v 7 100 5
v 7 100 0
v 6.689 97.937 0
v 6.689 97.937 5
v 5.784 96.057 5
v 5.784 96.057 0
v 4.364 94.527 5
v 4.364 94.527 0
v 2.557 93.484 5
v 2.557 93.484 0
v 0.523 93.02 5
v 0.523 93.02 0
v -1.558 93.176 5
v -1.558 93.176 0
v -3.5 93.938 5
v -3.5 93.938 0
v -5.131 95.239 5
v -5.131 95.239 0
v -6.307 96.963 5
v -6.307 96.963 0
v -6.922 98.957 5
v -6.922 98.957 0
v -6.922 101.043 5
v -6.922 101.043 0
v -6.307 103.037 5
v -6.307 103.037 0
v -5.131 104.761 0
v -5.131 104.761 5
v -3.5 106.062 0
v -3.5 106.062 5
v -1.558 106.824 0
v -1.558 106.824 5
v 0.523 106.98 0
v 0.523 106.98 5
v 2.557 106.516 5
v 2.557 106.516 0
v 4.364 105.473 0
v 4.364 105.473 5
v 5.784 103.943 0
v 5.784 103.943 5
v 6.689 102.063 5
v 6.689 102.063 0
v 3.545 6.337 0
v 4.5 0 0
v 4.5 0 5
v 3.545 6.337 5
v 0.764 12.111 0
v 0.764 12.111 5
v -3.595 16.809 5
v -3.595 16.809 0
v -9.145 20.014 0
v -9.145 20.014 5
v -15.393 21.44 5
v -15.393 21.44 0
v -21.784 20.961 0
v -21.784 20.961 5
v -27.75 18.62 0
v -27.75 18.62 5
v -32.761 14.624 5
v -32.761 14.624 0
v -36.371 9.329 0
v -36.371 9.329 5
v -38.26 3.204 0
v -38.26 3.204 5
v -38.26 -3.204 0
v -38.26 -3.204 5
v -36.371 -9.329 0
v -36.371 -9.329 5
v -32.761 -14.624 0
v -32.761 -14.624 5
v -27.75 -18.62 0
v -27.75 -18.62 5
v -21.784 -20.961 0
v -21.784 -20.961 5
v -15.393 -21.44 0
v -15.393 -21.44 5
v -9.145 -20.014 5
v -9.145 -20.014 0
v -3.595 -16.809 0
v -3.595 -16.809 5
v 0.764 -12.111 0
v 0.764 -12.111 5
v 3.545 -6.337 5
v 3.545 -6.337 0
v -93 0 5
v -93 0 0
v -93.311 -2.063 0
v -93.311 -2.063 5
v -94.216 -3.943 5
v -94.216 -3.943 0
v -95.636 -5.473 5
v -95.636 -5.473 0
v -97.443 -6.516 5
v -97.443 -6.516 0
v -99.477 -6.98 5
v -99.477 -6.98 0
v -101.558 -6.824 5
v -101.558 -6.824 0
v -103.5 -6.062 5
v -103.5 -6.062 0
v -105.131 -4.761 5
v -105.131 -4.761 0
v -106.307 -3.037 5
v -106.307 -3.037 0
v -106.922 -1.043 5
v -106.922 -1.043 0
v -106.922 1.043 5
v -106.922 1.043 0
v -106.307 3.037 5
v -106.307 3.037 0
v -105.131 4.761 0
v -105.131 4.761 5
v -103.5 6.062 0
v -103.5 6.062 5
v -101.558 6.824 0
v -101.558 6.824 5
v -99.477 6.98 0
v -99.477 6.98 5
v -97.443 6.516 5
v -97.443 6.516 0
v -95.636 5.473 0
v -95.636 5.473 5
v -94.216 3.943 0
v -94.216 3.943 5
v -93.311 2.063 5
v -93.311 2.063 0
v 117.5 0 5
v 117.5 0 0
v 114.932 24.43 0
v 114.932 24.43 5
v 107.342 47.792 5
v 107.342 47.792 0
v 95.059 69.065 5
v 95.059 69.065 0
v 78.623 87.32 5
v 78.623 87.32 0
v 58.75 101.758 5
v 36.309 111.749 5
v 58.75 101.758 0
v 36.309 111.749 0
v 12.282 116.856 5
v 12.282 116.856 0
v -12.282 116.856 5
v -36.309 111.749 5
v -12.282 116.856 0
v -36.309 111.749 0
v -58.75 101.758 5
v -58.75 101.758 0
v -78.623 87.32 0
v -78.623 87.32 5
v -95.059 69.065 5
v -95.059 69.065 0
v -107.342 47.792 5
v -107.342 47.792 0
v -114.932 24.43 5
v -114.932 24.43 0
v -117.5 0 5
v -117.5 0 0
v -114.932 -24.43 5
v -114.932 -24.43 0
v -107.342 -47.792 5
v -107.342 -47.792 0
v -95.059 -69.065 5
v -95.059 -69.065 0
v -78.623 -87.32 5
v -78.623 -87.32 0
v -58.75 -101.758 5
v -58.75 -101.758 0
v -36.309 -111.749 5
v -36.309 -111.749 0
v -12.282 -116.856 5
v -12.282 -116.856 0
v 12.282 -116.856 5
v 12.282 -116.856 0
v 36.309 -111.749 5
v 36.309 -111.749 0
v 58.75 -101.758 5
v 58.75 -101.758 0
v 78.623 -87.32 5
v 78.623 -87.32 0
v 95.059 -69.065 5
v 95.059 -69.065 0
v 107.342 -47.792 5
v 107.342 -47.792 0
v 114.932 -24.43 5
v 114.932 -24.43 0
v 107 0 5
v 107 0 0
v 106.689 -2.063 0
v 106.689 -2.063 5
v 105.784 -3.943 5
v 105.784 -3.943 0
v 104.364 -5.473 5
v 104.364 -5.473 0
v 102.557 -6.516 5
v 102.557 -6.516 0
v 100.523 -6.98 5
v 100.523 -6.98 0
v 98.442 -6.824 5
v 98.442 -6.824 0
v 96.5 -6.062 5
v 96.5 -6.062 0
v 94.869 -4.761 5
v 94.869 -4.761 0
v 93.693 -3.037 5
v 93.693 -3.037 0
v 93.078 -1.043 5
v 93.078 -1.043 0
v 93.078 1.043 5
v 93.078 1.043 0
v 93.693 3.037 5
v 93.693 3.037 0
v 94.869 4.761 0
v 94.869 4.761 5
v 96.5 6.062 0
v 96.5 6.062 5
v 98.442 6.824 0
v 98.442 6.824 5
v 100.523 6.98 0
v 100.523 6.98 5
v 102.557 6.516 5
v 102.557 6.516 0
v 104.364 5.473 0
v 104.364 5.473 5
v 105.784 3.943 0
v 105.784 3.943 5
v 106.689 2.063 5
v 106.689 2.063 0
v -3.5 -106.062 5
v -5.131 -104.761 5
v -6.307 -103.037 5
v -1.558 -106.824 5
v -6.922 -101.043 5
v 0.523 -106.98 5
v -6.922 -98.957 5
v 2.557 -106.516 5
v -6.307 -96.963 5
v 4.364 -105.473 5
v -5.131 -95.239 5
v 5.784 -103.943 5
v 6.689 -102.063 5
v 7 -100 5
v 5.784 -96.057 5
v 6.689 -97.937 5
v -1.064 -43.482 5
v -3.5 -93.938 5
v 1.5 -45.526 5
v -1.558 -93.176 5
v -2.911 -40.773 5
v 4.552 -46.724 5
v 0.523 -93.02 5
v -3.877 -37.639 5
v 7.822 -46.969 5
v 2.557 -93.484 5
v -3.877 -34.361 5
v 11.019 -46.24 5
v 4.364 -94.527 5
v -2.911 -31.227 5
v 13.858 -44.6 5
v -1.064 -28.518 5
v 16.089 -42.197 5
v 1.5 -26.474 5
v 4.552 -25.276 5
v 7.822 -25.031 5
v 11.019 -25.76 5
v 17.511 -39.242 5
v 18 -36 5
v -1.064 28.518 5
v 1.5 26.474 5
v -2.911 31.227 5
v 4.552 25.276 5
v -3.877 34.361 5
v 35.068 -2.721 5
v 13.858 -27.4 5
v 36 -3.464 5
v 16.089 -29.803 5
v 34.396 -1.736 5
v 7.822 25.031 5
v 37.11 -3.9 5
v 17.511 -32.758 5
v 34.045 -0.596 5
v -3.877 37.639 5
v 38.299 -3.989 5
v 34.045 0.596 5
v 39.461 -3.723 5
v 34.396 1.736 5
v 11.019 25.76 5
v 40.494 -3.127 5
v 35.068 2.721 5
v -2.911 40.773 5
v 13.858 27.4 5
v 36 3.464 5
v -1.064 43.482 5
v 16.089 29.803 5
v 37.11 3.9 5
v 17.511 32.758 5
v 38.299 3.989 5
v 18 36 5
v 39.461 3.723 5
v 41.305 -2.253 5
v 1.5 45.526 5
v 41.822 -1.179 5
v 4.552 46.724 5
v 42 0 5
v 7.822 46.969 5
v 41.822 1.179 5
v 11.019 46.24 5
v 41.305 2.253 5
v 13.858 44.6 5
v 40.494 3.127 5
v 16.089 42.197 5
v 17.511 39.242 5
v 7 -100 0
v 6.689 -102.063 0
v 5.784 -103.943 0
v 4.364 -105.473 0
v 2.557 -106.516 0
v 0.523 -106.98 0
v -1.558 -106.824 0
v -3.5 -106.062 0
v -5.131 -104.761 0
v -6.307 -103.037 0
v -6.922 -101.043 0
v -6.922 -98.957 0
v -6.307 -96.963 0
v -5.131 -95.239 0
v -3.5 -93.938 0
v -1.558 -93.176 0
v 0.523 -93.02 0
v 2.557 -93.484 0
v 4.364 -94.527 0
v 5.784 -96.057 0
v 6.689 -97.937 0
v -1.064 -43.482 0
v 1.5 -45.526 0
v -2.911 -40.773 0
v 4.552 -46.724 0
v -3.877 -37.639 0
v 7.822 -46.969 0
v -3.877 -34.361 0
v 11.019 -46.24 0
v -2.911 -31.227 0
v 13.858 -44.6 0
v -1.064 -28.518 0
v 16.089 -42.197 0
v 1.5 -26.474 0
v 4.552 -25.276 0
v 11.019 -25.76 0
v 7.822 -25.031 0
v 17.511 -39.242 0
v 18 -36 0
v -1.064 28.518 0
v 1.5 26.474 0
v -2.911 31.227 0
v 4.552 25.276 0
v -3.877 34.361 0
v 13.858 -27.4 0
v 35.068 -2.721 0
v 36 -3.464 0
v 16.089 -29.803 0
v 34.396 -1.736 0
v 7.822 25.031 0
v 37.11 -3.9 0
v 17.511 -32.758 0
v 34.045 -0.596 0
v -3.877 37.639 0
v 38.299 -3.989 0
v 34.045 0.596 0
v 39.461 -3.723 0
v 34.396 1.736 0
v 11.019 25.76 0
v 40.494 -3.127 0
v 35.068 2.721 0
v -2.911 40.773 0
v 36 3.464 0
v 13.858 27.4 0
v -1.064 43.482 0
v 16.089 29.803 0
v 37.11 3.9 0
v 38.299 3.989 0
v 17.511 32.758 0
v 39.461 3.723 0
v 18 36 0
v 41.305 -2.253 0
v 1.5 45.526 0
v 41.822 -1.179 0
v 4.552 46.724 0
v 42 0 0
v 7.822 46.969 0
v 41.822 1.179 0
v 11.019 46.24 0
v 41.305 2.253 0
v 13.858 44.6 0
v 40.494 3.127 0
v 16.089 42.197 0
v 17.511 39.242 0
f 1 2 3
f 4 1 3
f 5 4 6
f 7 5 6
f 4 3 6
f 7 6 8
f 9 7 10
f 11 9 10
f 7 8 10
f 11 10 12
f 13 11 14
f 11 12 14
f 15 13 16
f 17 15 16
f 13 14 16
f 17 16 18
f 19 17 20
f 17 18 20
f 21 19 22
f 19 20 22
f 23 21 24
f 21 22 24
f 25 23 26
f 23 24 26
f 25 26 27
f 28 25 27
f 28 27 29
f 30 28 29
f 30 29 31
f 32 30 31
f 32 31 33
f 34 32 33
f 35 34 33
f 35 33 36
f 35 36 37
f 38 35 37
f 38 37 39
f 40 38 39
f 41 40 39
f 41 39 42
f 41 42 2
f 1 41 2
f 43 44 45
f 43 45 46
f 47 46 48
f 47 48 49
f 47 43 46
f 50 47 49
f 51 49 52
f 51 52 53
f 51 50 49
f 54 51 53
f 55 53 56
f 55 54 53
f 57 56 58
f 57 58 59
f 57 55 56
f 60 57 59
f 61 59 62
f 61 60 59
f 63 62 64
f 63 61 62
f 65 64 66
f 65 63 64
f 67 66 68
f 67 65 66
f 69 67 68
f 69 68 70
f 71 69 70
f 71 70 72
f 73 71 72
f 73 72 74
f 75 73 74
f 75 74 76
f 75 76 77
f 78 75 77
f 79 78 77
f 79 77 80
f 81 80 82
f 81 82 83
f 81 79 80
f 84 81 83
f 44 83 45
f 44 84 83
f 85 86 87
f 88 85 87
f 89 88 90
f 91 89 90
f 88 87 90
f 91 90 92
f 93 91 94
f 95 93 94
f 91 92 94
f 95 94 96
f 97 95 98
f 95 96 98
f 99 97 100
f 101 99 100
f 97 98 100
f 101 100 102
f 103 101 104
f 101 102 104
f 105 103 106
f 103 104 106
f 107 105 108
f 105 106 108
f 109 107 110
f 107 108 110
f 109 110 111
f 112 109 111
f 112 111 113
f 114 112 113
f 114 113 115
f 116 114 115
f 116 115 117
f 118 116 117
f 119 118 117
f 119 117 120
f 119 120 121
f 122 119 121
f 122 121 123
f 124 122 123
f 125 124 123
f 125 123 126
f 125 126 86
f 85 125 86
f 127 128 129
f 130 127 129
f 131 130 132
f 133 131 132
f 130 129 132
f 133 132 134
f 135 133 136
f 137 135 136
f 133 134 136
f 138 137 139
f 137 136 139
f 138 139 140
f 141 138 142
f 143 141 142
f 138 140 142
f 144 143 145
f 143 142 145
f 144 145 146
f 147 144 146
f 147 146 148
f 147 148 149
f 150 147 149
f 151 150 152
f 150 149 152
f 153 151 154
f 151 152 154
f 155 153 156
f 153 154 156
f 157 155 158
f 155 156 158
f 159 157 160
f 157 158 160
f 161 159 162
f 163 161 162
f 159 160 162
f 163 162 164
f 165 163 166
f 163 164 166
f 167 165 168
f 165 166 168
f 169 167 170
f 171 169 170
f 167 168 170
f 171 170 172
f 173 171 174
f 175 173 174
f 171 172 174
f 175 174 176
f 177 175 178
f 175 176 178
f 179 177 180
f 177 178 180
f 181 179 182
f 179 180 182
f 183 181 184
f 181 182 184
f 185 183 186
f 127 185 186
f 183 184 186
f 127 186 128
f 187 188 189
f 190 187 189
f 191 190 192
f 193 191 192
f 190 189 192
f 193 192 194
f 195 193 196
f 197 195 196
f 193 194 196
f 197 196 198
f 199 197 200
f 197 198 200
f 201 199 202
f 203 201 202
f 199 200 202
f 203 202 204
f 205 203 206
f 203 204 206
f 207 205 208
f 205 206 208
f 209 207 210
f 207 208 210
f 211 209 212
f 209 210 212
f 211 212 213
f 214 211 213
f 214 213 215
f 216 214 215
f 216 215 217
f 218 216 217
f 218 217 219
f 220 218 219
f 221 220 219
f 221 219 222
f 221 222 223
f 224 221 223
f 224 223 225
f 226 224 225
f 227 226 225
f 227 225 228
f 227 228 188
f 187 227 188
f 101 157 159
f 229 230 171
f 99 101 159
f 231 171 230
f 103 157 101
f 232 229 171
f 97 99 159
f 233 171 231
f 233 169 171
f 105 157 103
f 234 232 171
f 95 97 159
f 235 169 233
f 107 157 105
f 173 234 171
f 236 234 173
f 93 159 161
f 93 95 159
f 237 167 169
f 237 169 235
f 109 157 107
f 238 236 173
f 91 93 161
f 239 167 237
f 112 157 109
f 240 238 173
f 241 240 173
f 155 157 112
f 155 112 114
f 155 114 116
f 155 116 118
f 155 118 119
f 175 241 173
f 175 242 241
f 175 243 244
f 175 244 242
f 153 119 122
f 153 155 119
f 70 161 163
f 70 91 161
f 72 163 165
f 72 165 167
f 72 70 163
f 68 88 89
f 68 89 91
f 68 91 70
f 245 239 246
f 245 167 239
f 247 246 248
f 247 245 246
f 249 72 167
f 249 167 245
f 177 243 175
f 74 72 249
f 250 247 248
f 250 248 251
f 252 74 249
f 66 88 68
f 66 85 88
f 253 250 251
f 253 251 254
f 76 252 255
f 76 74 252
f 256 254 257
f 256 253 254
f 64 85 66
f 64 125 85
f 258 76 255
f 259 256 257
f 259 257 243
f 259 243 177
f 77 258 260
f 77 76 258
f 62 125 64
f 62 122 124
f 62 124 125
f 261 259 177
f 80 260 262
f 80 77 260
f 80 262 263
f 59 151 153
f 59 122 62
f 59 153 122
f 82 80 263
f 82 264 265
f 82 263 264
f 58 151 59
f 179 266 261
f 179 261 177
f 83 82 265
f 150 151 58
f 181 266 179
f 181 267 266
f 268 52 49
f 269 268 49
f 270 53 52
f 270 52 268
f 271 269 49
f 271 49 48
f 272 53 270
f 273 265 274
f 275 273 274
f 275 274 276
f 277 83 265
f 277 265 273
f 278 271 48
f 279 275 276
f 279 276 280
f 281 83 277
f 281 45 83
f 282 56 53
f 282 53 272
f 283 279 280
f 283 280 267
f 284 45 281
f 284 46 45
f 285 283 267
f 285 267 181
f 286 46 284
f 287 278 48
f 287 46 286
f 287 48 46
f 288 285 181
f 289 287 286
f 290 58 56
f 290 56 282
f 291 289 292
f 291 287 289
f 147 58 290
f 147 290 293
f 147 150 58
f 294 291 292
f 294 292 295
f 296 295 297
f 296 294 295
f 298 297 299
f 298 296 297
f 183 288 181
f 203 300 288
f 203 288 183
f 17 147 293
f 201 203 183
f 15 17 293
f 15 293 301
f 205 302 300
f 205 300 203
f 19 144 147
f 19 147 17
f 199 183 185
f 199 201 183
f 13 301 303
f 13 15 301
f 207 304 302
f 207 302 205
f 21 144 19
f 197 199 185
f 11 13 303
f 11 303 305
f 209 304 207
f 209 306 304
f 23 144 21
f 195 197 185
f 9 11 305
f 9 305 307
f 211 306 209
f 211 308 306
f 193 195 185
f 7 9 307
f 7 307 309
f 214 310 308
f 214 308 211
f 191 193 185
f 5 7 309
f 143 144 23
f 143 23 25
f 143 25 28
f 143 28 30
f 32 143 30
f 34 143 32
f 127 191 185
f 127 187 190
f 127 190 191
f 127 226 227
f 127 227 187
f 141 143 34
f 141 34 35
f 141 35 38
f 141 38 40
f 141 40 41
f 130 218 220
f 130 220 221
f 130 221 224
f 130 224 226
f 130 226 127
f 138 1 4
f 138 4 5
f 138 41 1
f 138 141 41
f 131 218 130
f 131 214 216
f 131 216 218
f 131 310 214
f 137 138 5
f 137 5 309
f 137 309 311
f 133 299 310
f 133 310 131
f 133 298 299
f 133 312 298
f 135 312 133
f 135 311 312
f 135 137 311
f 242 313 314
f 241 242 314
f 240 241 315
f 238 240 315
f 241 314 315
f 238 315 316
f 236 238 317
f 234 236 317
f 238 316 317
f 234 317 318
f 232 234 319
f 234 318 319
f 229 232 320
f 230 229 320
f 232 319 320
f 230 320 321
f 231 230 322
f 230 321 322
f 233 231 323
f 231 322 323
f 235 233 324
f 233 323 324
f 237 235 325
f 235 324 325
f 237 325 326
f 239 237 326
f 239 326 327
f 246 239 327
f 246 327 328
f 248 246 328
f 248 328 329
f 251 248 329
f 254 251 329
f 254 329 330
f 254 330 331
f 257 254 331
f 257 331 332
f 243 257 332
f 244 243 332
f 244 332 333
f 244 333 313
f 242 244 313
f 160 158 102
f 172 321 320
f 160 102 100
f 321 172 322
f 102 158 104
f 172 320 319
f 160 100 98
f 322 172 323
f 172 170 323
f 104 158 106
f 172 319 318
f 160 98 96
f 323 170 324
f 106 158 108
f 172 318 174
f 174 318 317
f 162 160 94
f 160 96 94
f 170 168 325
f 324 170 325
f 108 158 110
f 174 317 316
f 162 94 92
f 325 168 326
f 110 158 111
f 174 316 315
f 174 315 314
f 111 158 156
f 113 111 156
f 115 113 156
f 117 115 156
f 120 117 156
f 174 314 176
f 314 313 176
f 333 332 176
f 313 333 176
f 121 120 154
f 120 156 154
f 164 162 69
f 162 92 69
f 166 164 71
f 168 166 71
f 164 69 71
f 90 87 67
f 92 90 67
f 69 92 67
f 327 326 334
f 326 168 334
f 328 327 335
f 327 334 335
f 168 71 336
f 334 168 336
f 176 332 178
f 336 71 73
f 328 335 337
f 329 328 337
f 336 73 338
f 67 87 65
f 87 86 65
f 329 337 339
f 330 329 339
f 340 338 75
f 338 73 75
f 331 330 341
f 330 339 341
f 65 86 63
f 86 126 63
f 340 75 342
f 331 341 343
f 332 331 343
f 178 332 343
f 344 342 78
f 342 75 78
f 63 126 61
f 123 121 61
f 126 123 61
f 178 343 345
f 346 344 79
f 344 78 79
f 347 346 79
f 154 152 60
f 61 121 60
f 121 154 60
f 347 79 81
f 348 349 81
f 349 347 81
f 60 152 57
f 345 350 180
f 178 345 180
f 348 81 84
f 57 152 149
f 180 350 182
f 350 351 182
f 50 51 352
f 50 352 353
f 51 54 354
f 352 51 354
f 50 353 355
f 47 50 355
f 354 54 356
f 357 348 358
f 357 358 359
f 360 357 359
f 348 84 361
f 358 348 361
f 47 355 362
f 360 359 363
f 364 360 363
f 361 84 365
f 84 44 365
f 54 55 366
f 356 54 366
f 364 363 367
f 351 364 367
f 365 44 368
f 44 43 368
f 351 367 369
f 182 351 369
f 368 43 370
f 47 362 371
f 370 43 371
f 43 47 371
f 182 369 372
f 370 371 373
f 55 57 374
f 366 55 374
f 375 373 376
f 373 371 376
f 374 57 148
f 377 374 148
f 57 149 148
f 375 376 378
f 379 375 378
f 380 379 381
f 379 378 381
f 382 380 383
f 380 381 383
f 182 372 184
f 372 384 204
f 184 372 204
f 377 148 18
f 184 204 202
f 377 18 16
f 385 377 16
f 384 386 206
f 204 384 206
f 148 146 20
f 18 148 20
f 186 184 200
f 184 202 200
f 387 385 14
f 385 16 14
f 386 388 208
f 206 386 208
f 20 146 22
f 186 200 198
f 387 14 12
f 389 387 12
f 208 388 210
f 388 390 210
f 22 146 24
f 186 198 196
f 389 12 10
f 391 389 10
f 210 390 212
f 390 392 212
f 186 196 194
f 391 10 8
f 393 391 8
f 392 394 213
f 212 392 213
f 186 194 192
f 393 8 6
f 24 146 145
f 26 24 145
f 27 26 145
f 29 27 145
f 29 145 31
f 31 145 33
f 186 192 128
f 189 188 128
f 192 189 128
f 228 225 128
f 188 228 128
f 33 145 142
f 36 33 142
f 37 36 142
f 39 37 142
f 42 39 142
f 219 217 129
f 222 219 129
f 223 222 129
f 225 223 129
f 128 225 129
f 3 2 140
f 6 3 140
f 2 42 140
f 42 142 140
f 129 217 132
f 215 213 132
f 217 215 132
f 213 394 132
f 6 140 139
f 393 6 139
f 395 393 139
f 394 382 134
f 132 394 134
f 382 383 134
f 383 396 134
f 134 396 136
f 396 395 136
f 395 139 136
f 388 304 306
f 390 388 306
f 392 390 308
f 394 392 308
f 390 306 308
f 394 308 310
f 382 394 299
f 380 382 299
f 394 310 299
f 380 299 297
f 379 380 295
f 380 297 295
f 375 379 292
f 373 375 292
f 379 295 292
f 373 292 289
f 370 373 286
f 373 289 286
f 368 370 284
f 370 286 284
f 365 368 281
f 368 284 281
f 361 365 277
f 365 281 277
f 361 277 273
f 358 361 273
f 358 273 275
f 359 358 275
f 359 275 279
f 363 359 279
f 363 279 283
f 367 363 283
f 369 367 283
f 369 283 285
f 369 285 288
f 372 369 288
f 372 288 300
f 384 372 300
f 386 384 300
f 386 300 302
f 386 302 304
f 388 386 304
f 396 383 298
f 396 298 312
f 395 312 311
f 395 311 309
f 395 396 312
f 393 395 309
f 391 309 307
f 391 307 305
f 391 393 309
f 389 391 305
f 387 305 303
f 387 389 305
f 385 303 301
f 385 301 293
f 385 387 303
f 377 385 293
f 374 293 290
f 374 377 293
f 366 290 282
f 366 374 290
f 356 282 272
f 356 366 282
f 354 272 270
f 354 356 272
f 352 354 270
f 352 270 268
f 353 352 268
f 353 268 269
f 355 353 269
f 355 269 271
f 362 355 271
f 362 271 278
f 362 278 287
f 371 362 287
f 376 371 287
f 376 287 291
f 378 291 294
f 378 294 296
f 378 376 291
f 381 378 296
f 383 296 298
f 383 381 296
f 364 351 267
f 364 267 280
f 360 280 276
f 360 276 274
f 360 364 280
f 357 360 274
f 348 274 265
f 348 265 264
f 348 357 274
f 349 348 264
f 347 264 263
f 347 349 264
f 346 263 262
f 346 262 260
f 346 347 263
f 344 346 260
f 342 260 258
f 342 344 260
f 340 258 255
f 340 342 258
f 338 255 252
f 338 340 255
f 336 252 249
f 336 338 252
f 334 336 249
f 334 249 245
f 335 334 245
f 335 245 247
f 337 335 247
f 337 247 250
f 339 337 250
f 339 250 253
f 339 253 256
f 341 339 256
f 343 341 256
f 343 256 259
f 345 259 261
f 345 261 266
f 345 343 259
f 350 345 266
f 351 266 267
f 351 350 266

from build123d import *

# Parameters (mm, degrees)
F0_R     = 117.5
F0_R_2   = 11
F0_R_3   = 21.5
F1_DEPTH = 5
F2_R     = 7
F3_DEPTH = 5.001
F4_R     = 4
F5_DEPTH = 5.001


with BuildPart() as f1:
    # F0 (on Top) → F1 (new body)
    with BuildSketch(Plane.XY):
        Circle(F0_R)
        with Locations((7, -36)):
            Circle(F0_R_2, mode=Mode.SUBTRACT)
        with Locations((-17, 0)):
            Circle(F0_R_3, mode=Mode.SUBTRACT)
        with Locations((7, 36)):
            Circle(F0_R_2, mode=Mode.SUBTRACT)
    extrude(amount=F1_DEPTH)

    # F2 (on face) → F3 (cut, through all)
    with BuildSketch(Plane(origin=(0, 0, 0), x_dir=(1, 0, 0), z_dir=(0, 0, -1))):
        with Locations((-100, 0)):
            Circle(F2_R)
        with Locations((0, 100)):
            Circle(F2_R)
        with Locations((100, 0)):
            Circle(F2_R)
        with Locations((0, -100)):
            Circle(F2_R)
    extrude(amount=-F3_DEPTH, mode=Mode.SUBTRACT)

    # F4 (on face) → F5 (cut, through all)
    with BuildSketch(Plane.XY.offset(5)):
        with Locations((38, 0)):
            Circle(F4_R)
    extrude(amount=-F5_DEPTH, mode=Mode.SUBTRACT)


solid = f1.part
